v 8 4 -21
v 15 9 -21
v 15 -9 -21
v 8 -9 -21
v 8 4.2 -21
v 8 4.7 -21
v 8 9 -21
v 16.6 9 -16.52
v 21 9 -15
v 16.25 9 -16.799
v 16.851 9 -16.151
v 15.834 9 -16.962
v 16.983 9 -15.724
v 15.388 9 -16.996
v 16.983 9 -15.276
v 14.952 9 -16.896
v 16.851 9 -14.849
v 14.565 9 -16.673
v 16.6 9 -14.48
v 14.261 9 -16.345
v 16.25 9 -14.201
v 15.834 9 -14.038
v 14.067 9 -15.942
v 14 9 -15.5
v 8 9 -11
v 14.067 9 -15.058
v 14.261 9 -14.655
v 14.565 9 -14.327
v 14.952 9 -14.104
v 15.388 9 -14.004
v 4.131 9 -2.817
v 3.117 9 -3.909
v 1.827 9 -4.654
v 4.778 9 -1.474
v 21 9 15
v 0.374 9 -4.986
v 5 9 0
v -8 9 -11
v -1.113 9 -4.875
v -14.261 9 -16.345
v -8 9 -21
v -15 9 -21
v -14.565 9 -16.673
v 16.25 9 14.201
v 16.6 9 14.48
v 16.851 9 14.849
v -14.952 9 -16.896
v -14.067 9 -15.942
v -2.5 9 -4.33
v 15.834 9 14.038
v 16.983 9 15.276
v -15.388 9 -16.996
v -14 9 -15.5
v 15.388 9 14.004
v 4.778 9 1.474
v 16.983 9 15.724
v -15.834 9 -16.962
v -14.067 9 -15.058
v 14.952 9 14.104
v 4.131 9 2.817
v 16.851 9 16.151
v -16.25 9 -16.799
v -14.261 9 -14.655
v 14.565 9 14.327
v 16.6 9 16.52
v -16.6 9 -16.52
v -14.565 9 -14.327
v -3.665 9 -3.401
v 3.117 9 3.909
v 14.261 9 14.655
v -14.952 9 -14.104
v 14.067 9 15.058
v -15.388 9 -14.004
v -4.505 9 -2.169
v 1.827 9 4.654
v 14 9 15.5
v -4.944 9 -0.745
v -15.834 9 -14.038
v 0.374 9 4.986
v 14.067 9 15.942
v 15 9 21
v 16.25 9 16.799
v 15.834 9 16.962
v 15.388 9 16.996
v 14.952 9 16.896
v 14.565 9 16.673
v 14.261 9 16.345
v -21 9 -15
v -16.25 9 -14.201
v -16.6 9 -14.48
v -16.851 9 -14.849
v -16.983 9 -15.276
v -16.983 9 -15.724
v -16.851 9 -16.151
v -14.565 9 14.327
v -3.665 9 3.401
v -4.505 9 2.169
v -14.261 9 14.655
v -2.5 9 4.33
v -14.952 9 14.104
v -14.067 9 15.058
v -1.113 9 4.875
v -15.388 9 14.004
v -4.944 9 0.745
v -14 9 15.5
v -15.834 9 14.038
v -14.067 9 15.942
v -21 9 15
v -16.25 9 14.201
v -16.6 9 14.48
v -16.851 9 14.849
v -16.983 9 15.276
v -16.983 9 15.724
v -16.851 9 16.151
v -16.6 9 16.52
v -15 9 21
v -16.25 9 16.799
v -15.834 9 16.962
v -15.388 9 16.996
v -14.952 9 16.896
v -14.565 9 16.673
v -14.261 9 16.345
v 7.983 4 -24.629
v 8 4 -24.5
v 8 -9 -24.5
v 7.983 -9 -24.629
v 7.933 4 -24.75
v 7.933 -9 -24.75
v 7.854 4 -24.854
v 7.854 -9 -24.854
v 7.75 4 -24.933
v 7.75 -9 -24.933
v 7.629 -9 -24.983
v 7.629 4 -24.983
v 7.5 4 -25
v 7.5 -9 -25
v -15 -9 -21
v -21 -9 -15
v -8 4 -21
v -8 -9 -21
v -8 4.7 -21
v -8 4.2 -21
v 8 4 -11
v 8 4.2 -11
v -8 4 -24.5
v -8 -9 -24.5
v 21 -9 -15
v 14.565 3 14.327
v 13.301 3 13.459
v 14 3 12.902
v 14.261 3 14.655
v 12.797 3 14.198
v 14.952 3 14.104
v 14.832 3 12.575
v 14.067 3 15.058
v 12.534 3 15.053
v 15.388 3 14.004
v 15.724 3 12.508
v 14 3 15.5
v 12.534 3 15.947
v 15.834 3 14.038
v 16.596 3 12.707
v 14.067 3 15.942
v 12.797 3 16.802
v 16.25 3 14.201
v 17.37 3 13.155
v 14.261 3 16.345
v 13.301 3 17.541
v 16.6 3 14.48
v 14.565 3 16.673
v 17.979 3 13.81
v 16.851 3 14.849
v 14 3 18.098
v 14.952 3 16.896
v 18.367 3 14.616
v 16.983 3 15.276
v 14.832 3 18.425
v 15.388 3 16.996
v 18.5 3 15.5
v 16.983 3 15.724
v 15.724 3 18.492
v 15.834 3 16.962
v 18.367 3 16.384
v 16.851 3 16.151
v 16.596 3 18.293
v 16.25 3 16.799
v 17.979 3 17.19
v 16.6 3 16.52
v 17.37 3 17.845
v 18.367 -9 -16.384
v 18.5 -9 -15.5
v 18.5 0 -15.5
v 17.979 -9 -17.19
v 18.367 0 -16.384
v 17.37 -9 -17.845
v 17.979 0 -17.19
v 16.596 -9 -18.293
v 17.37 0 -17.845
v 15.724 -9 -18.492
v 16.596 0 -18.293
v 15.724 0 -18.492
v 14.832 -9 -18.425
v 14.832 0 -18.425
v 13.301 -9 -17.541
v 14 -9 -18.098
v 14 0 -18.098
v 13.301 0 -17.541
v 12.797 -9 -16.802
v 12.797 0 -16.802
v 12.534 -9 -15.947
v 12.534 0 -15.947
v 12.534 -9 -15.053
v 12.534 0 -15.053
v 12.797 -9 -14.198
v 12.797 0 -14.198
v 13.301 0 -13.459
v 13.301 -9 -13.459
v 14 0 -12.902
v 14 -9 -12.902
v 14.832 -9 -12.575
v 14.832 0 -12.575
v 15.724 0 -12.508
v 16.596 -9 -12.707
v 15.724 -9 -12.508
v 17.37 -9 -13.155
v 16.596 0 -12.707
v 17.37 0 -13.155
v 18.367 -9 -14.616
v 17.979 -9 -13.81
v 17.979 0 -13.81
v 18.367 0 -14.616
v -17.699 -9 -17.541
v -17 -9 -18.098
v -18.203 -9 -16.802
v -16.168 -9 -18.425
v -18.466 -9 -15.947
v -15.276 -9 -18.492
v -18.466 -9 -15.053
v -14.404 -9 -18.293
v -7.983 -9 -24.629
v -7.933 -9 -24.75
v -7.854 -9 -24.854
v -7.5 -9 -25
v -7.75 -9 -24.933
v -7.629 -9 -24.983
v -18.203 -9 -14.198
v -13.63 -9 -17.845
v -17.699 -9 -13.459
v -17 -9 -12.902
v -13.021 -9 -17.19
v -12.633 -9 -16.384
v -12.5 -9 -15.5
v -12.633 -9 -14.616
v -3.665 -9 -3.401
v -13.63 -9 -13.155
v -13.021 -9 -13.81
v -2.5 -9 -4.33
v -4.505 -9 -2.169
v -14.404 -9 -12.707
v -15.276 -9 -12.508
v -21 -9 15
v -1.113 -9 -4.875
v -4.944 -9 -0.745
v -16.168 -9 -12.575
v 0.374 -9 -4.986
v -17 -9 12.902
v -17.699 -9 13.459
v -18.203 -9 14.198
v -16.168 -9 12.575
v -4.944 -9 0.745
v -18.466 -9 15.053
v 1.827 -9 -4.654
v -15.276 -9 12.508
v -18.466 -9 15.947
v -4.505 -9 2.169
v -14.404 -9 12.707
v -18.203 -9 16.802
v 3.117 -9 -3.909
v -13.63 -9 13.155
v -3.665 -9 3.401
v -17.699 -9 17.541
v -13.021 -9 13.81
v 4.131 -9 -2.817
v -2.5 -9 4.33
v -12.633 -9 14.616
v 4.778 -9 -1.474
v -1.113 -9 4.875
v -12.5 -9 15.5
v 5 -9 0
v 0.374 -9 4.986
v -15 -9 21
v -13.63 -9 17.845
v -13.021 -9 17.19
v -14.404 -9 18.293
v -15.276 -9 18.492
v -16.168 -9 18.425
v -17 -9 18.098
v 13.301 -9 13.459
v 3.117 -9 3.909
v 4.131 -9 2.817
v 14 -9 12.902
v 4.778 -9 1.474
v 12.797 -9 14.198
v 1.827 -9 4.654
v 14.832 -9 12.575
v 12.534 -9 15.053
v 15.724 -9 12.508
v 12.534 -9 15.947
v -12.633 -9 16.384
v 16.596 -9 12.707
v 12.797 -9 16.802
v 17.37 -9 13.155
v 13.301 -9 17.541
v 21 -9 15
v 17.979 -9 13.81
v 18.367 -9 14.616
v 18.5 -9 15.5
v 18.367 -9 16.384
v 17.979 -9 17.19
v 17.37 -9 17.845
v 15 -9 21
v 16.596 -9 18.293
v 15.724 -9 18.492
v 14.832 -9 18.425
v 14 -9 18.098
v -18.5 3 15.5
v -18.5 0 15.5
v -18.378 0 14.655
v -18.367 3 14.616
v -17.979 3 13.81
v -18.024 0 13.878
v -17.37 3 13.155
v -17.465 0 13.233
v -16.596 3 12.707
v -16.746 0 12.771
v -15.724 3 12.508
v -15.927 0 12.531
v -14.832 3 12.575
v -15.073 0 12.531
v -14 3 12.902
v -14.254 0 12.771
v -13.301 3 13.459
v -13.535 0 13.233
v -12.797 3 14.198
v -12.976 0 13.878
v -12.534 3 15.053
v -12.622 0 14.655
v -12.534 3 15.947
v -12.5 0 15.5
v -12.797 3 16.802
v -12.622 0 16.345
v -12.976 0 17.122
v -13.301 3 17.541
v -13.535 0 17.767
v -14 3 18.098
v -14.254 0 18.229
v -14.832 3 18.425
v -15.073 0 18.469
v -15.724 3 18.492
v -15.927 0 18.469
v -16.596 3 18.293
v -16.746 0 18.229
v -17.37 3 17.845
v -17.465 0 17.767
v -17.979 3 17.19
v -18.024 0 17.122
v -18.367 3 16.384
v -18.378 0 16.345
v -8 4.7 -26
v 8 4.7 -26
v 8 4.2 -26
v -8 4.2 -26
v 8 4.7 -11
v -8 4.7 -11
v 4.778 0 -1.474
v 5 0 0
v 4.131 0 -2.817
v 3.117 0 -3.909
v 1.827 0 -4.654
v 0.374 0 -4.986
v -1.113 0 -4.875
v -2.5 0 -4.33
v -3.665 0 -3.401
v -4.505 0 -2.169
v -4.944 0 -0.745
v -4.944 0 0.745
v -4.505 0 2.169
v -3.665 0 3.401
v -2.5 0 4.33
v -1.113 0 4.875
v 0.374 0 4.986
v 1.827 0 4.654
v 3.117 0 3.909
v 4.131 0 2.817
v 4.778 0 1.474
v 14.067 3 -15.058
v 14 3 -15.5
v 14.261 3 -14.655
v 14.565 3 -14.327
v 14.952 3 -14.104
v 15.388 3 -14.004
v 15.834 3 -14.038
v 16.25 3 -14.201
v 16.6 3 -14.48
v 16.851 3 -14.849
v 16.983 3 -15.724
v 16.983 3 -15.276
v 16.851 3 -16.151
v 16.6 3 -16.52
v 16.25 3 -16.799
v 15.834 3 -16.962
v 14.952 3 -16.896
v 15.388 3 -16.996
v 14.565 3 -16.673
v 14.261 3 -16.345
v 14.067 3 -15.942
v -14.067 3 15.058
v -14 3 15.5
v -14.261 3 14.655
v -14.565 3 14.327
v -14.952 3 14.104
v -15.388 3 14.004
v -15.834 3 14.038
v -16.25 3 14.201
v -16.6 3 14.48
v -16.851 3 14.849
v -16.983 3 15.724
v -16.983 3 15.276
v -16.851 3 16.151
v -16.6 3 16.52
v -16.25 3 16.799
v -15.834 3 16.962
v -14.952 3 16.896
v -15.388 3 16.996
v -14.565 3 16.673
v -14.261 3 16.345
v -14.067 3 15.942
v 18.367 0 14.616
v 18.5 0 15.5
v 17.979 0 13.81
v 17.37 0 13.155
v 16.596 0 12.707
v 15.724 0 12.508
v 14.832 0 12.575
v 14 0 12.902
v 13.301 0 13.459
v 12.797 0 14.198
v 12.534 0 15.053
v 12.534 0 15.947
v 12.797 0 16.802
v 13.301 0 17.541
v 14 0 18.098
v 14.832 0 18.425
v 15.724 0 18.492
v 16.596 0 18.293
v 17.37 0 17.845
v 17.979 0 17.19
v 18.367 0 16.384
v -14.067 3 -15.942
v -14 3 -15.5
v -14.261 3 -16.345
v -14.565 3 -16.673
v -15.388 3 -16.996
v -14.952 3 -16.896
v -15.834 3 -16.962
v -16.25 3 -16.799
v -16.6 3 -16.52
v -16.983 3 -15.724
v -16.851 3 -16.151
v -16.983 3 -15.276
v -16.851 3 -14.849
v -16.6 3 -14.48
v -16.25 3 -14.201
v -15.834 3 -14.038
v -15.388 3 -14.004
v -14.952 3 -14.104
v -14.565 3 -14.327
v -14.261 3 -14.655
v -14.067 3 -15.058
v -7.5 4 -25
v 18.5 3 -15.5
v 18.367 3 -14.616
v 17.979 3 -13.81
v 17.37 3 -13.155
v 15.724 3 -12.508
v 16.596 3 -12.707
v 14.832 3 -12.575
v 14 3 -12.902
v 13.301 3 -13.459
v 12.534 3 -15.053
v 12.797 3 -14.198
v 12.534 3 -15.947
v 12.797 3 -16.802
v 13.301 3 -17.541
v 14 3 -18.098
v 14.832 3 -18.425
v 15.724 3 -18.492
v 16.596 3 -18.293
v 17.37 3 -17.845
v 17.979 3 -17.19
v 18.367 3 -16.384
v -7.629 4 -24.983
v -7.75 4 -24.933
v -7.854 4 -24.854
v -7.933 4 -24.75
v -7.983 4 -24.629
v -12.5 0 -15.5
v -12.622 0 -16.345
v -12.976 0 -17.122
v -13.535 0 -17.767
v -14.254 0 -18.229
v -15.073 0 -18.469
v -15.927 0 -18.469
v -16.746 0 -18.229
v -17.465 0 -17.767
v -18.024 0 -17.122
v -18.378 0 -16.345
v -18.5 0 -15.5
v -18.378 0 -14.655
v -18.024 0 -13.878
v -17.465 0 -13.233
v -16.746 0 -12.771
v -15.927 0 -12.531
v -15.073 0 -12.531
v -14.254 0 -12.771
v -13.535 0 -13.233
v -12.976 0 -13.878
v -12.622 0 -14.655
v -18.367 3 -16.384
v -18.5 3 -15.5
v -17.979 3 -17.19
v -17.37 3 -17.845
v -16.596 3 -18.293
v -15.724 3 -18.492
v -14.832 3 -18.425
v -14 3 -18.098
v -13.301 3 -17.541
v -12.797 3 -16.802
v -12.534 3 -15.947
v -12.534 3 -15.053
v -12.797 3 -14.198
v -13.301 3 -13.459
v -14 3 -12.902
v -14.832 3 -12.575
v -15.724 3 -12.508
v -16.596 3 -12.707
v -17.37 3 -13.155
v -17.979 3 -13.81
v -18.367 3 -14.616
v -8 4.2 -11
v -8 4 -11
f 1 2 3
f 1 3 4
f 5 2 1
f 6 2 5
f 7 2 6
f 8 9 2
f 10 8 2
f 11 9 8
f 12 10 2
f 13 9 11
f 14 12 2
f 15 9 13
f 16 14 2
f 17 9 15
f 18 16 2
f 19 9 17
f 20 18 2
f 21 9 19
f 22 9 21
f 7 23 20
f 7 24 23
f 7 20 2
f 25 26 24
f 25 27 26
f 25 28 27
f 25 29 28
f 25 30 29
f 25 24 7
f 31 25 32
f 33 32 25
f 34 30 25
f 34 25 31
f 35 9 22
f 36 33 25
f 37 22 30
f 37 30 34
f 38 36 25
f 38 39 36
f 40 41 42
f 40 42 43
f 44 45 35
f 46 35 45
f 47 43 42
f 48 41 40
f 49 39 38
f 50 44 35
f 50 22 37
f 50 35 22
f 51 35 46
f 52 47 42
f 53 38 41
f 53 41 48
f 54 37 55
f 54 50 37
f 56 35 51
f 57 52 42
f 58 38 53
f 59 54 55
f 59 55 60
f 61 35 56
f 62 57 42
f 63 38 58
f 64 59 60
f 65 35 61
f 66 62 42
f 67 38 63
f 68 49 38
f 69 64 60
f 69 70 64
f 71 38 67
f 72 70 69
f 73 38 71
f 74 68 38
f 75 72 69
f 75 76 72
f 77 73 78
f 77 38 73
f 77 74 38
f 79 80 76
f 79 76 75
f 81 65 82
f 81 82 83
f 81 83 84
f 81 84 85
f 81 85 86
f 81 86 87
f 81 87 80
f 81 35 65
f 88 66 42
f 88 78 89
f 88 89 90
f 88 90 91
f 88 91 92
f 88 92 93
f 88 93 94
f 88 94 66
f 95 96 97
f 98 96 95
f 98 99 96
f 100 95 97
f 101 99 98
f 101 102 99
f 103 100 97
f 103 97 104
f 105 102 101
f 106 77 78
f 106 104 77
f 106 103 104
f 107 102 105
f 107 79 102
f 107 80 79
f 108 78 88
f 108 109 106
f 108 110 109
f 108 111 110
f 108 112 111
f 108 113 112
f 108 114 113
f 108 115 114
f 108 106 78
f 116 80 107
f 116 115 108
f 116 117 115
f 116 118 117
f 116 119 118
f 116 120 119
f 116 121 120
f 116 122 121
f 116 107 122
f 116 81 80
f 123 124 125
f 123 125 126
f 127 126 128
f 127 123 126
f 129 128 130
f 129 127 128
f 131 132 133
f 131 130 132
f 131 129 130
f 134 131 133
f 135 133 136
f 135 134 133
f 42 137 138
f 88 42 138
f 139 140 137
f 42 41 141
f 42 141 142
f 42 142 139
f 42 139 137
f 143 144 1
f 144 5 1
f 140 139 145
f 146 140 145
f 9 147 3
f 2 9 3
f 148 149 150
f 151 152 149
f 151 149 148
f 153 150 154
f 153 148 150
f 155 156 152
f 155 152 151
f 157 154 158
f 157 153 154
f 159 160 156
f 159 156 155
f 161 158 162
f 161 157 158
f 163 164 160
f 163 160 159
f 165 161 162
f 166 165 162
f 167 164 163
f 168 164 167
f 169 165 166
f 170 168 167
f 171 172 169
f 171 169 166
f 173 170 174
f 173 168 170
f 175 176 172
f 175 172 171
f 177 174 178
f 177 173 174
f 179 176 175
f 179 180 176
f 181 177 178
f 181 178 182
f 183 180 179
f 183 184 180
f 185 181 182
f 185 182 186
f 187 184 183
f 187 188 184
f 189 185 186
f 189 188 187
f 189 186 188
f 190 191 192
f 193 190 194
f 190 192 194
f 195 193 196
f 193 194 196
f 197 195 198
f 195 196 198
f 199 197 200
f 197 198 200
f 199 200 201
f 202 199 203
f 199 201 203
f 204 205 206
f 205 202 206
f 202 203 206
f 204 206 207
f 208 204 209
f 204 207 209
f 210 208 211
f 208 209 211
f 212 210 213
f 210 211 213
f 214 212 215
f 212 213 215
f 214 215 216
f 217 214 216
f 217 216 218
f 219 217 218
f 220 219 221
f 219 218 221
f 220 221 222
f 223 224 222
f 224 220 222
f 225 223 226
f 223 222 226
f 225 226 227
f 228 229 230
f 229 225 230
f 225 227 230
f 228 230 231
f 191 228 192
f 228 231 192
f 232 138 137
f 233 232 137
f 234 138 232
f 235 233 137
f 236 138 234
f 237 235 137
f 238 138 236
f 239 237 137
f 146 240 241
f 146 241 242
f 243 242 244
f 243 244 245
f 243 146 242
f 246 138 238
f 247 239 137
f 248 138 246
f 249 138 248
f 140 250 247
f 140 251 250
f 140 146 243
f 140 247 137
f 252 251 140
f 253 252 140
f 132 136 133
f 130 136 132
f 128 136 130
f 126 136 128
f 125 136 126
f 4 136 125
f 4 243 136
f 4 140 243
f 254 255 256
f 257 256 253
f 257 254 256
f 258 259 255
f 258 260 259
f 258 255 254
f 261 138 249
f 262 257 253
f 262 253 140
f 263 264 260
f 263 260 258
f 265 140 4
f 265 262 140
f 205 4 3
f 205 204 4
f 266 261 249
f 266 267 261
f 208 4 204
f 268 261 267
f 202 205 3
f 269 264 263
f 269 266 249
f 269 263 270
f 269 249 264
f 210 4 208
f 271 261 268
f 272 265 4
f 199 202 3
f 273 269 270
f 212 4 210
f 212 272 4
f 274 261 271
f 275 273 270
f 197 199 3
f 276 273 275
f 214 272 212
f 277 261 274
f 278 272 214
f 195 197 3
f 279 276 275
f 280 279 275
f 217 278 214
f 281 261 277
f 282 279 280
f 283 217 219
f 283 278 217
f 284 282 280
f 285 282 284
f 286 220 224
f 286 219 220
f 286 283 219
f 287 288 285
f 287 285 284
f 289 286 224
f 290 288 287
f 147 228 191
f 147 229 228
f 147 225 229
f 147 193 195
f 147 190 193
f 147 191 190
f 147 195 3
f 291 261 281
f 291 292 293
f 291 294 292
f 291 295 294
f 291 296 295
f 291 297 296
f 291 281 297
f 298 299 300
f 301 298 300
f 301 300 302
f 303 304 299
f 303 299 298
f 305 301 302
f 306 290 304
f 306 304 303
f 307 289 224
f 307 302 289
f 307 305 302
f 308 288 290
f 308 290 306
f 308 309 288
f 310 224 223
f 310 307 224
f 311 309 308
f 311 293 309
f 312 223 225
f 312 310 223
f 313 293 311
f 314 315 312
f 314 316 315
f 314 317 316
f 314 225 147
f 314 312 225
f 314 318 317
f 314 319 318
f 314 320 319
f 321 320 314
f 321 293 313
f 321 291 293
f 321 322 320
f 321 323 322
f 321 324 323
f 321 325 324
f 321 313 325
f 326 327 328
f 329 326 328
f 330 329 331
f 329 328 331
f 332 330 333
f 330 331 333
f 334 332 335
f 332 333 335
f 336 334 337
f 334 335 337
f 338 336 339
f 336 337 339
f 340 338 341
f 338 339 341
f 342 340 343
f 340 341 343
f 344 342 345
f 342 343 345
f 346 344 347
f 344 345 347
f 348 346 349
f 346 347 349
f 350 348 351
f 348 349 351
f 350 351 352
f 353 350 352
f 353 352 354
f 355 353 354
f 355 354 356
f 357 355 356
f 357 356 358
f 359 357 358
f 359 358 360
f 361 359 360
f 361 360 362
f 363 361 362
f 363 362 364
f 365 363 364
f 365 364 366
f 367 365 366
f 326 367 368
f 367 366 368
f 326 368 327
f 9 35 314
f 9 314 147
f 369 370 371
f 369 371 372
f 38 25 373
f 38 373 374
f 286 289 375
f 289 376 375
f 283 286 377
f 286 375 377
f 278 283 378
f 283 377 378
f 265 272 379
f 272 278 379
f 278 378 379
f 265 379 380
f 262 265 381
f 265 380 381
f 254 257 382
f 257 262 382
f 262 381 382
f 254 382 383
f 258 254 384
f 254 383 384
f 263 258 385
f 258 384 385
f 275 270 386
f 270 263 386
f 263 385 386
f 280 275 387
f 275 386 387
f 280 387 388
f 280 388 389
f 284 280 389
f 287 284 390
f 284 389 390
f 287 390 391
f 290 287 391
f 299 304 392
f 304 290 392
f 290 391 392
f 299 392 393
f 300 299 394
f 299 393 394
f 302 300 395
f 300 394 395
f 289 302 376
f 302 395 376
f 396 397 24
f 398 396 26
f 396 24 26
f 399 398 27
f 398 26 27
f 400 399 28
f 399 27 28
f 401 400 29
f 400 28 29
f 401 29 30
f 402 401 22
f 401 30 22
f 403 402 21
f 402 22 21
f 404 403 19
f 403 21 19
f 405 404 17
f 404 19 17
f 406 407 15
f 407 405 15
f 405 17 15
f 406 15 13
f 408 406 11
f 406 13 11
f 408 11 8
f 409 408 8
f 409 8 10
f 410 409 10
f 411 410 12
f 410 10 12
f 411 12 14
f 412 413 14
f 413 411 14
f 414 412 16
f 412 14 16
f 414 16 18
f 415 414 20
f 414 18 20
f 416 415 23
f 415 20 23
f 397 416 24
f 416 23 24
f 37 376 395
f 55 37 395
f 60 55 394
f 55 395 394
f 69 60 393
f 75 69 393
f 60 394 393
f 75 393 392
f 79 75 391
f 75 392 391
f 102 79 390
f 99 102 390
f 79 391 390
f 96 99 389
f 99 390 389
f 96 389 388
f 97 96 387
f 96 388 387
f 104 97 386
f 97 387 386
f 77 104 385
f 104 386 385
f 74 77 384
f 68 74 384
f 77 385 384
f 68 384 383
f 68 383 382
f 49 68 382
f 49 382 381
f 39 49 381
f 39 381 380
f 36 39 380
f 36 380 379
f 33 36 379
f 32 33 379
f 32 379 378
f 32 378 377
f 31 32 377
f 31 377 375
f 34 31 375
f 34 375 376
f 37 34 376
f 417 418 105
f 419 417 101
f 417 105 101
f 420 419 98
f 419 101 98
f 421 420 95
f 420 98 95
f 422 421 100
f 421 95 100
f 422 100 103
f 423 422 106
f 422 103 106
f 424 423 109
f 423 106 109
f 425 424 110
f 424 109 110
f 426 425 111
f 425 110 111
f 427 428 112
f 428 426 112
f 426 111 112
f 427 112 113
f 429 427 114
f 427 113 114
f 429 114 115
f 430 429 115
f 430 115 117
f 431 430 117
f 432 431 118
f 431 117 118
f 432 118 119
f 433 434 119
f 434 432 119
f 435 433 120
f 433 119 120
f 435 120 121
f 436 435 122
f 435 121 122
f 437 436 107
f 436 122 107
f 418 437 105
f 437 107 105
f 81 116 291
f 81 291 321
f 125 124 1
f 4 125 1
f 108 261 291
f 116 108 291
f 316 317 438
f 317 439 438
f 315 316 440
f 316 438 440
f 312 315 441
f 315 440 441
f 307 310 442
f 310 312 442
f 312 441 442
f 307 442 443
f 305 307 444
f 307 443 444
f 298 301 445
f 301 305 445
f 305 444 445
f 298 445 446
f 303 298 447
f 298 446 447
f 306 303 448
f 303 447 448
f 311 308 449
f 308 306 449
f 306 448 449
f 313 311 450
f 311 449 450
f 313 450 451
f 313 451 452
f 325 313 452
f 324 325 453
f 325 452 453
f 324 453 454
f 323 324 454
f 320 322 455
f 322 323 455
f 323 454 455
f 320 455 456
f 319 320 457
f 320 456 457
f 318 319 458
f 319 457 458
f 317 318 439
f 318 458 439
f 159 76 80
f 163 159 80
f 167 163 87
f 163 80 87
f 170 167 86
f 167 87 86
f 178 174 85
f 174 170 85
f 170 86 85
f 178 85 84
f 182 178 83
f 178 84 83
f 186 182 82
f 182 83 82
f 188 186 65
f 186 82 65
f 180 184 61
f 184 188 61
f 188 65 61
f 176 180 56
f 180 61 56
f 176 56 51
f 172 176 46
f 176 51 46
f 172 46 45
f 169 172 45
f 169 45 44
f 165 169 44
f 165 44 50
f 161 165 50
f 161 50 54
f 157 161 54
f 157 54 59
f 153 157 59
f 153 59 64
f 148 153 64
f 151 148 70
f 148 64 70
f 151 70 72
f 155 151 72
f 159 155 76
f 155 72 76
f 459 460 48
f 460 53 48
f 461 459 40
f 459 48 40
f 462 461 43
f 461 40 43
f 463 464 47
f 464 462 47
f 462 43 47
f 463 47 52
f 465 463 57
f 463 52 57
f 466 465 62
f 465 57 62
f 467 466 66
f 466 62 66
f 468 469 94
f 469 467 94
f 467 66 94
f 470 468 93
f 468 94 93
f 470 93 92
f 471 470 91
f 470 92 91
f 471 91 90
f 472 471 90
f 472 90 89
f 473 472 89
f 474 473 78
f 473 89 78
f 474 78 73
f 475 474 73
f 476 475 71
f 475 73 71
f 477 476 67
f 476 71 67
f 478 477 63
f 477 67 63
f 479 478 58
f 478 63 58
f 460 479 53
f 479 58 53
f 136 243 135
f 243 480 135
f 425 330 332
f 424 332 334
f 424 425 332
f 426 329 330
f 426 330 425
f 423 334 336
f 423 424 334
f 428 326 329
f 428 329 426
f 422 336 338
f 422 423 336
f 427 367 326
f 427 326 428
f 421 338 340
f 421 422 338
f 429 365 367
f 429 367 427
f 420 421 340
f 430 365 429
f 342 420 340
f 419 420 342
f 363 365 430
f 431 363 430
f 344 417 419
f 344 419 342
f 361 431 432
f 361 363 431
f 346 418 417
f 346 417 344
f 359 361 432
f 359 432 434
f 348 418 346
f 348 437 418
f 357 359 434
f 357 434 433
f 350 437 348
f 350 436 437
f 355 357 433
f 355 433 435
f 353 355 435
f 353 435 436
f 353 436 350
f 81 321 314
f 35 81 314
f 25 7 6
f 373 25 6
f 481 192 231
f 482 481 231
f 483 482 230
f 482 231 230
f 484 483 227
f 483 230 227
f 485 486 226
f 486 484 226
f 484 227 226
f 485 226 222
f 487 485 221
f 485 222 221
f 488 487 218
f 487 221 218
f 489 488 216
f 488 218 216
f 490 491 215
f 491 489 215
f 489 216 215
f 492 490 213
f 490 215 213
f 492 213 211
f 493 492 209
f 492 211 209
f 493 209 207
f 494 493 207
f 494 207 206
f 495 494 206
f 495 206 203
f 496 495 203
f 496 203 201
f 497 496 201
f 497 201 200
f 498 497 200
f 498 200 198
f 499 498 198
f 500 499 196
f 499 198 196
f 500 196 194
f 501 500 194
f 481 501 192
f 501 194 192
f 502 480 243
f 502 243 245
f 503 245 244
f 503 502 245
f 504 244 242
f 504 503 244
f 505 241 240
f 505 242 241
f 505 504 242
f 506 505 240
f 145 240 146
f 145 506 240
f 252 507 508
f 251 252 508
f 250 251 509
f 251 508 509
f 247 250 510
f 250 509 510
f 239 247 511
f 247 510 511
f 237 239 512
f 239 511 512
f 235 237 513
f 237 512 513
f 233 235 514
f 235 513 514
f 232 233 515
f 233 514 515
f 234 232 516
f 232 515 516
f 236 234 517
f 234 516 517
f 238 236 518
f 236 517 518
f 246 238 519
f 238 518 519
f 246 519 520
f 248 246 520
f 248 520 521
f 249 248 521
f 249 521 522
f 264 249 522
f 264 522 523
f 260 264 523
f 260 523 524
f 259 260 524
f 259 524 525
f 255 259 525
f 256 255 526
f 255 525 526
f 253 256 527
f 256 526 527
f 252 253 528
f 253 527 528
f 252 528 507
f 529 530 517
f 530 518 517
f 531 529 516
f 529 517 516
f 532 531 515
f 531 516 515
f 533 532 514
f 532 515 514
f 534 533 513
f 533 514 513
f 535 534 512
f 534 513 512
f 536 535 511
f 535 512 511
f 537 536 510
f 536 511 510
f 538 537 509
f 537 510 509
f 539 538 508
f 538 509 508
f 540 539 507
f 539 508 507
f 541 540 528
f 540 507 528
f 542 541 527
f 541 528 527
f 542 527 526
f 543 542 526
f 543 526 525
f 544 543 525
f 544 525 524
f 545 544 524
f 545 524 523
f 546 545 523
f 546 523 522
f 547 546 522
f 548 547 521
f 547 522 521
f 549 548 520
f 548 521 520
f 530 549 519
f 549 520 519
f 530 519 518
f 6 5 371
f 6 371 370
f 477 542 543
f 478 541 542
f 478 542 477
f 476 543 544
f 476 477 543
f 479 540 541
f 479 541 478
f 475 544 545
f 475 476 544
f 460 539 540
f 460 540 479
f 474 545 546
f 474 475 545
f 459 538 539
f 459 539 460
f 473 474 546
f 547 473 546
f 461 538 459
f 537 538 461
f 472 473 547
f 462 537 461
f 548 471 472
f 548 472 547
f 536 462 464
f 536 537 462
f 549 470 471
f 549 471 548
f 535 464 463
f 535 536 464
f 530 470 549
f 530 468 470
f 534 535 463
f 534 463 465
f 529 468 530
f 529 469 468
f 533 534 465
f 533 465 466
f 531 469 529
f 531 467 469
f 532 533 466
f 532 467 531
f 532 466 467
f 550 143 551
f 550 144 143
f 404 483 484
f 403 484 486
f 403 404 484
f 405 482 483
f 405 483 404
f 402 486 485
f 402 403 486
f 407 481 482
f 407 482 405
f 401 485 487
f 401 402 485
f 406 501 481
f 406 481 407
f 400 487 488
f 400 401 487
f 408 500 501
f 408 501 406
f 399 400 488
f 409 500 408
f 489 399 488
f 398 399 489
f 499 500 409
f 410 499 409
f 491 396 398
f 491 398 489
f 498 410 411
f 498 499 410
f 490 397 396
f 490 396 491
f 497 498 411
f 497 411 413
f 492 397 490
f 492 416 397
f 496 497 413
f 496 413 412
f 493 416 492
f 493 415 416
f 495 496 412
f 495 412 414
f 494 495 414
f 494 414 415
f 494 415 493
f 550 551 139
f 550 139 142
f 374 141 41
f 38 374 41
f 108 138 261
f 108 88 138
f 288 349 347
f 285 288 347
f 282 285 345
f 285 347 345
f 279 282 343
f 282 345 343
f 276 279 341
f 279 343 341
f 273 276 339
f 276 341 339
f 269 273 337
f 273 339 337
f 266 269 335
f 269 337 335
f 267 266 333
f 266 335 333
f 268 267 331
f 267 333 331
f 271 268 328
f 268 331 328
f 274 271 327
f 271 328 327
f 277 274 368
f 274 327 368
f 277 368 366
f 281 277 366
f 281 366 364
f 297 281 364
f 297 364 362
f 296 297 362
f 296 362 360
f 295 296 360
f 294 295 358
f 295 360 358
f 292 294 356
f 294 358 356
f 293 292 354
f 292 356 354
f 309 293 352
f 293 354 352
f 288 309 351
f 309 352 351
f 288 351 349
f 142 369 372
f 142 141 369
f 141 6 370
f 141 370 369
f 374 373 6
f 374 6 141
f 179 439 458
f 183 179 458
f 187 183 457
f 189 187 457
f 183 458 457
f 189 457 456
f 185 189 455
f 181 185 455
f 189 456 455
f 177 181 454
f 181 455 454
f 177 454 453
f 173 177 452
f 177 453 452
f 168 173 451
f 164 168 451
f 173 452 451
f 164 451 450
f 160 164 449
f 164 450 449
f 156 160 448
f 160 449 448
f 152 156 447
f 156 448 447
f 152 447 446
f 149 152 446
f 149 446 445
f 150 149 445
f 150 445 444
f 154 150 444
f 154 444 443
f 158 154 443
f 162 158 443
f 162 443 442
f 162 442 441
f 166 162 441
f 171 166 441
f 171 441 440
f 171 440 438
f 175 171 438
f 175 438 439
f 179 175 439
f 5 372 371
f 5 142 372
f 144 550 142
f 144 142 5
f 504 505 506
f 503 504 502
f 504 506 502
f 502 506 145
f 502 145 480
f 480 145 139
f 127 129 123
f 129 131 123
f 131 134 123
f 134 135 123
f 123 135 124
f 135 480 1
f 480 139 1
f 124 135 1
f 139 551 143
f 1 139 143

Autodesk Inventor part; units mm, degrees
ref_plane "YZ Plane" through (0, 0, 0) normal (1, 0, 0) x (0, 1, 0)
ref_plane "XZ Plane" through (0, 0, 0) normal (0, 1, 0) x (-1, 0, 0)
ref_plane "XY Plane" through (0, 0, 0) normal (0, 0, 1) x (1, 0, 0)
sketch "Sketch1" plane through (0, 0, 0) normal (0, 1, 0) x (-1, 0, 0)
  line L0 (-21, -21) -> (21, -21)
  line L1 (21, -21) -> (21, 21)
  line L2 (21, 21) -> (-21, 21)
  line L3 (-21, 21) -> (-21, -21)
  line L4 (-21, -21) -> (21, 21) construction
  line L5 (21, -21) -> (-21, 21) construction
  point P0 (0, 0)
  dimension "d0" = 42
  dimension "d1" = 42
extrude "Extrusion1" add sketch "Sketch1" along normal blind 9
chamfer "Chamfer1" distance 6 angle 45 4 edges at (21, 4.5, -21) (-21, 4.5, -21) (-21, 4.5, 21) (21, 4.5, 21)
sketch "Sketch2" plane through (0, 9, 0) normal (0, 1, 0) x (1, 0, 0)
  point P0 (0, 0)
sketch "Sketch3" plane through (0, 0, 0) normal (0, -1, 0) x (1, 0, 0)
  circle A0 centre (0, 0) radius 5
  dimension "d7" = 10
extrude "Extrusion2" cut sketch "Sketch3" against normal up to surface (9 mm away)
sketch "Sketch4" plane through (0, 9, 0) normal (0, 1, 0) x (1, 0, 0)
  circle A0 centre (-15.5, -15.5) radius 1.5
  line L0 (-15, -21) -> (15, -21) projected
  line L1 (-21, 15) -> (-21, -15) projected
  point P0 (0, 0)
  dimension "d10" = 3
  dimension "d11" = 5.5
  dimension "d12" = 5.5
extrude "Extrusion3" cut sketch "Sketch4" against normal up to surface (9 mm away)
mirror "Mirror1" about plane through (0, 0, 0) normal (1, 0, 0) of "Extrusion3"
mirror "Mirror2" about plane through (0, 0, 0) normal (0, 0, 1) of "Extrusion3", "Mirror1"
sketch "Sketch6" plane through (0, 0, 0) normal (0, -1, 0) x (1, 0, 0)
  circle A0 centre (15.5, -15.5) radius 1.5 projected
  circle A1 centre (-15.5, -15.5) radius 1.5 projected
  circle A2 centre (15.5, 15.5) radius 1.5 projected
  circle A3 centre (-15.5, 15.5) radius 1.5 projected
  circle A4 centre (0, 0) radius 5 projected
  line L0 (15, 21) -> (21, 15) projected
  line L1 (-15, 21) -> (15, 21) projected
  line L2 (-21, 15) -> (-15, 21) projected
  line L3 (-21, -15) -> (-21, 15) projected
  line L4 (-15, -21) -> (-21, -15) projected
  line L5 (15, -21) -> (-15, -21) projected
  line L6 (21, -15) -> (15, -21) projected
  line L7 (21, 15) -> (21, -15) projected
  line L8 (8, -21) -> (-8, -21)
  line L9 (-8, -21) -> (-8, -25)
  line L10 (-8, -25) -> (8, -25)
  line L11 (8, -25) -> (8, -21)
  dimension "d20" = 16
  dimension "d21" = 8
  dimension "d24" = 4
extrude "Extrusion5" add sketch "Sketch6" against normal blind 4 contours L11 L10 L9 L5
fillet "Fillet1" radius 0.5 2 edges at (8, 2, -25) (-8, 2, -25)
sketch "Sketch7" plane through (15, 9, -21) normal (0, 0, -1) x (-1, 0, 0)
  line L0 (23, -5) -> (23, -9) projected
  line L1 (23, -9) -> (30, -9) projected
  line L2 (30, 0) -> (30, -9) projected
  line L3 (0, 0) -> (30, 0) projected
  line L4 (0, -9) -> (0, 0) projected
  line L5 (0, -9) -> (7, -9) projected
  line L6 (7, -9) -> (7, -5) projected
  line L7 (7, -5) -> (23, -5) projected
  line L8 (7, -5) -> (23, -5)
  line L9 (23, -5) -> (23, 0)
  line L10 (23, 0) -> (7, 0)
  line L11 (7, 0) -> (7, -5)
  point P0 (15, -9)
extrude "Extrusion6" cut sketch "Sketch7" against normal blind 10 contours L7 L11 L3 L9
sketch "Sketch8" plane through (15, 9, -11) normal (0, 0, -1) x (-1, 0, 0)
  line L0 (23, -5) -> (7, -5) projected
  line L1 (23, 0) -> (23, -5) projected
  line L2 (7, 0) -> (23, 0) projected
  line L3 (7, -5) -> (7, 0) projected
  line L4 (23, 0) -> (23, -5) projected
  line L5 (7, -4.3) -> (23, -4.3)
  line L6 (23, -4.3) -> (23, -4.8)
  line L7 (23, -4.8) -> (7, -4.8)
  line L8 (7, -4.8) -> (7, -4.3)
  point P0 (15, -9)
  dimension "d28" = 0.5
  dimension "d29" = 0.2
extrude "Extrusion7" add sketch "Sketch8" along normal blind 15 contours L7 L3 L5 L1
sketch "Sketch9" plane through (15, 9, -11) normal (0, 0, -1) x (-1, 0, 0)
  point P0 (15, -9)
sketch "Sketch10" plane through (0, 0, 0) normal (0, -1, 0) x (1, 0, 0)
  circle A0 centre (15.5, 15.5) radius 1.5 projected
  circle A1 centre (15.5, 15.5) radius 3
  point P0 (0, 0)
  dimension "d32" = 6
extrude "Extrusion8" cut sketch "Sketch10" against normal blind 3
mirror "Mirror3" about plane through (0, 0, 0) normal (1, 0, 0) of "Extrusion8"
mirror "Mirror4" about plane through (0, 0, 0) normal (0, 0, 1) of "Extrusion8", "Mirror3"
sketch "Skizze11" plane through (0, 0, 0) normal (0, -1, 0) x (1, 0, 0)
  circle A0 centre (-15.5, -15.5) radius 3 projected
  circle A1 centre (15.5, -15.5) radius 3 projected
  circle A2 centre (-15.5, 15.5) radius 3 projected
  circle A3 centre (15.5, 15.5) radius 3 projected
  circle A4 centre (0, 0) radius 5 projected
  arc A5 (-8, -24.5) -> (-7.5, -25) centre (-7.5, -24.5) ccw projected
  line L0 (-7.5, -25) -> (7.5, -25) projected
  arc A6 (7.5, -25) -> (8, -24.5) centre (7.5, -24.5) ccw projected
  line L1 (8, -24.5) -> (8, -21) projected
  line L2 (15, -21) -> (8, -21) projected
  line L3 (21, -15) -> (15, -21) projected
  line L4 (21, 15) -> (21, -15) projected
  line L5 (15, 21) -> (21, 15) projected
  line L6 (-15, 21) -> (15, 21) projected
  line L7 (-21, 15) -> (-15, 21) projected
  line L8 (-21, -15) -> (-21, 15) projected
  line L9 (-15, -21) -> (-21, -15) projected
  line L10 (-8, -21) -> (-15, -21) projected
  line L11 (-8, -21) -> (-8, -24.5) projected
extrude "Extrusion9" add sketch "Skizze11" along normal blind 9
equation "\"d12\" = d11"
equation "\"d21\" = 0.5 * d20"
